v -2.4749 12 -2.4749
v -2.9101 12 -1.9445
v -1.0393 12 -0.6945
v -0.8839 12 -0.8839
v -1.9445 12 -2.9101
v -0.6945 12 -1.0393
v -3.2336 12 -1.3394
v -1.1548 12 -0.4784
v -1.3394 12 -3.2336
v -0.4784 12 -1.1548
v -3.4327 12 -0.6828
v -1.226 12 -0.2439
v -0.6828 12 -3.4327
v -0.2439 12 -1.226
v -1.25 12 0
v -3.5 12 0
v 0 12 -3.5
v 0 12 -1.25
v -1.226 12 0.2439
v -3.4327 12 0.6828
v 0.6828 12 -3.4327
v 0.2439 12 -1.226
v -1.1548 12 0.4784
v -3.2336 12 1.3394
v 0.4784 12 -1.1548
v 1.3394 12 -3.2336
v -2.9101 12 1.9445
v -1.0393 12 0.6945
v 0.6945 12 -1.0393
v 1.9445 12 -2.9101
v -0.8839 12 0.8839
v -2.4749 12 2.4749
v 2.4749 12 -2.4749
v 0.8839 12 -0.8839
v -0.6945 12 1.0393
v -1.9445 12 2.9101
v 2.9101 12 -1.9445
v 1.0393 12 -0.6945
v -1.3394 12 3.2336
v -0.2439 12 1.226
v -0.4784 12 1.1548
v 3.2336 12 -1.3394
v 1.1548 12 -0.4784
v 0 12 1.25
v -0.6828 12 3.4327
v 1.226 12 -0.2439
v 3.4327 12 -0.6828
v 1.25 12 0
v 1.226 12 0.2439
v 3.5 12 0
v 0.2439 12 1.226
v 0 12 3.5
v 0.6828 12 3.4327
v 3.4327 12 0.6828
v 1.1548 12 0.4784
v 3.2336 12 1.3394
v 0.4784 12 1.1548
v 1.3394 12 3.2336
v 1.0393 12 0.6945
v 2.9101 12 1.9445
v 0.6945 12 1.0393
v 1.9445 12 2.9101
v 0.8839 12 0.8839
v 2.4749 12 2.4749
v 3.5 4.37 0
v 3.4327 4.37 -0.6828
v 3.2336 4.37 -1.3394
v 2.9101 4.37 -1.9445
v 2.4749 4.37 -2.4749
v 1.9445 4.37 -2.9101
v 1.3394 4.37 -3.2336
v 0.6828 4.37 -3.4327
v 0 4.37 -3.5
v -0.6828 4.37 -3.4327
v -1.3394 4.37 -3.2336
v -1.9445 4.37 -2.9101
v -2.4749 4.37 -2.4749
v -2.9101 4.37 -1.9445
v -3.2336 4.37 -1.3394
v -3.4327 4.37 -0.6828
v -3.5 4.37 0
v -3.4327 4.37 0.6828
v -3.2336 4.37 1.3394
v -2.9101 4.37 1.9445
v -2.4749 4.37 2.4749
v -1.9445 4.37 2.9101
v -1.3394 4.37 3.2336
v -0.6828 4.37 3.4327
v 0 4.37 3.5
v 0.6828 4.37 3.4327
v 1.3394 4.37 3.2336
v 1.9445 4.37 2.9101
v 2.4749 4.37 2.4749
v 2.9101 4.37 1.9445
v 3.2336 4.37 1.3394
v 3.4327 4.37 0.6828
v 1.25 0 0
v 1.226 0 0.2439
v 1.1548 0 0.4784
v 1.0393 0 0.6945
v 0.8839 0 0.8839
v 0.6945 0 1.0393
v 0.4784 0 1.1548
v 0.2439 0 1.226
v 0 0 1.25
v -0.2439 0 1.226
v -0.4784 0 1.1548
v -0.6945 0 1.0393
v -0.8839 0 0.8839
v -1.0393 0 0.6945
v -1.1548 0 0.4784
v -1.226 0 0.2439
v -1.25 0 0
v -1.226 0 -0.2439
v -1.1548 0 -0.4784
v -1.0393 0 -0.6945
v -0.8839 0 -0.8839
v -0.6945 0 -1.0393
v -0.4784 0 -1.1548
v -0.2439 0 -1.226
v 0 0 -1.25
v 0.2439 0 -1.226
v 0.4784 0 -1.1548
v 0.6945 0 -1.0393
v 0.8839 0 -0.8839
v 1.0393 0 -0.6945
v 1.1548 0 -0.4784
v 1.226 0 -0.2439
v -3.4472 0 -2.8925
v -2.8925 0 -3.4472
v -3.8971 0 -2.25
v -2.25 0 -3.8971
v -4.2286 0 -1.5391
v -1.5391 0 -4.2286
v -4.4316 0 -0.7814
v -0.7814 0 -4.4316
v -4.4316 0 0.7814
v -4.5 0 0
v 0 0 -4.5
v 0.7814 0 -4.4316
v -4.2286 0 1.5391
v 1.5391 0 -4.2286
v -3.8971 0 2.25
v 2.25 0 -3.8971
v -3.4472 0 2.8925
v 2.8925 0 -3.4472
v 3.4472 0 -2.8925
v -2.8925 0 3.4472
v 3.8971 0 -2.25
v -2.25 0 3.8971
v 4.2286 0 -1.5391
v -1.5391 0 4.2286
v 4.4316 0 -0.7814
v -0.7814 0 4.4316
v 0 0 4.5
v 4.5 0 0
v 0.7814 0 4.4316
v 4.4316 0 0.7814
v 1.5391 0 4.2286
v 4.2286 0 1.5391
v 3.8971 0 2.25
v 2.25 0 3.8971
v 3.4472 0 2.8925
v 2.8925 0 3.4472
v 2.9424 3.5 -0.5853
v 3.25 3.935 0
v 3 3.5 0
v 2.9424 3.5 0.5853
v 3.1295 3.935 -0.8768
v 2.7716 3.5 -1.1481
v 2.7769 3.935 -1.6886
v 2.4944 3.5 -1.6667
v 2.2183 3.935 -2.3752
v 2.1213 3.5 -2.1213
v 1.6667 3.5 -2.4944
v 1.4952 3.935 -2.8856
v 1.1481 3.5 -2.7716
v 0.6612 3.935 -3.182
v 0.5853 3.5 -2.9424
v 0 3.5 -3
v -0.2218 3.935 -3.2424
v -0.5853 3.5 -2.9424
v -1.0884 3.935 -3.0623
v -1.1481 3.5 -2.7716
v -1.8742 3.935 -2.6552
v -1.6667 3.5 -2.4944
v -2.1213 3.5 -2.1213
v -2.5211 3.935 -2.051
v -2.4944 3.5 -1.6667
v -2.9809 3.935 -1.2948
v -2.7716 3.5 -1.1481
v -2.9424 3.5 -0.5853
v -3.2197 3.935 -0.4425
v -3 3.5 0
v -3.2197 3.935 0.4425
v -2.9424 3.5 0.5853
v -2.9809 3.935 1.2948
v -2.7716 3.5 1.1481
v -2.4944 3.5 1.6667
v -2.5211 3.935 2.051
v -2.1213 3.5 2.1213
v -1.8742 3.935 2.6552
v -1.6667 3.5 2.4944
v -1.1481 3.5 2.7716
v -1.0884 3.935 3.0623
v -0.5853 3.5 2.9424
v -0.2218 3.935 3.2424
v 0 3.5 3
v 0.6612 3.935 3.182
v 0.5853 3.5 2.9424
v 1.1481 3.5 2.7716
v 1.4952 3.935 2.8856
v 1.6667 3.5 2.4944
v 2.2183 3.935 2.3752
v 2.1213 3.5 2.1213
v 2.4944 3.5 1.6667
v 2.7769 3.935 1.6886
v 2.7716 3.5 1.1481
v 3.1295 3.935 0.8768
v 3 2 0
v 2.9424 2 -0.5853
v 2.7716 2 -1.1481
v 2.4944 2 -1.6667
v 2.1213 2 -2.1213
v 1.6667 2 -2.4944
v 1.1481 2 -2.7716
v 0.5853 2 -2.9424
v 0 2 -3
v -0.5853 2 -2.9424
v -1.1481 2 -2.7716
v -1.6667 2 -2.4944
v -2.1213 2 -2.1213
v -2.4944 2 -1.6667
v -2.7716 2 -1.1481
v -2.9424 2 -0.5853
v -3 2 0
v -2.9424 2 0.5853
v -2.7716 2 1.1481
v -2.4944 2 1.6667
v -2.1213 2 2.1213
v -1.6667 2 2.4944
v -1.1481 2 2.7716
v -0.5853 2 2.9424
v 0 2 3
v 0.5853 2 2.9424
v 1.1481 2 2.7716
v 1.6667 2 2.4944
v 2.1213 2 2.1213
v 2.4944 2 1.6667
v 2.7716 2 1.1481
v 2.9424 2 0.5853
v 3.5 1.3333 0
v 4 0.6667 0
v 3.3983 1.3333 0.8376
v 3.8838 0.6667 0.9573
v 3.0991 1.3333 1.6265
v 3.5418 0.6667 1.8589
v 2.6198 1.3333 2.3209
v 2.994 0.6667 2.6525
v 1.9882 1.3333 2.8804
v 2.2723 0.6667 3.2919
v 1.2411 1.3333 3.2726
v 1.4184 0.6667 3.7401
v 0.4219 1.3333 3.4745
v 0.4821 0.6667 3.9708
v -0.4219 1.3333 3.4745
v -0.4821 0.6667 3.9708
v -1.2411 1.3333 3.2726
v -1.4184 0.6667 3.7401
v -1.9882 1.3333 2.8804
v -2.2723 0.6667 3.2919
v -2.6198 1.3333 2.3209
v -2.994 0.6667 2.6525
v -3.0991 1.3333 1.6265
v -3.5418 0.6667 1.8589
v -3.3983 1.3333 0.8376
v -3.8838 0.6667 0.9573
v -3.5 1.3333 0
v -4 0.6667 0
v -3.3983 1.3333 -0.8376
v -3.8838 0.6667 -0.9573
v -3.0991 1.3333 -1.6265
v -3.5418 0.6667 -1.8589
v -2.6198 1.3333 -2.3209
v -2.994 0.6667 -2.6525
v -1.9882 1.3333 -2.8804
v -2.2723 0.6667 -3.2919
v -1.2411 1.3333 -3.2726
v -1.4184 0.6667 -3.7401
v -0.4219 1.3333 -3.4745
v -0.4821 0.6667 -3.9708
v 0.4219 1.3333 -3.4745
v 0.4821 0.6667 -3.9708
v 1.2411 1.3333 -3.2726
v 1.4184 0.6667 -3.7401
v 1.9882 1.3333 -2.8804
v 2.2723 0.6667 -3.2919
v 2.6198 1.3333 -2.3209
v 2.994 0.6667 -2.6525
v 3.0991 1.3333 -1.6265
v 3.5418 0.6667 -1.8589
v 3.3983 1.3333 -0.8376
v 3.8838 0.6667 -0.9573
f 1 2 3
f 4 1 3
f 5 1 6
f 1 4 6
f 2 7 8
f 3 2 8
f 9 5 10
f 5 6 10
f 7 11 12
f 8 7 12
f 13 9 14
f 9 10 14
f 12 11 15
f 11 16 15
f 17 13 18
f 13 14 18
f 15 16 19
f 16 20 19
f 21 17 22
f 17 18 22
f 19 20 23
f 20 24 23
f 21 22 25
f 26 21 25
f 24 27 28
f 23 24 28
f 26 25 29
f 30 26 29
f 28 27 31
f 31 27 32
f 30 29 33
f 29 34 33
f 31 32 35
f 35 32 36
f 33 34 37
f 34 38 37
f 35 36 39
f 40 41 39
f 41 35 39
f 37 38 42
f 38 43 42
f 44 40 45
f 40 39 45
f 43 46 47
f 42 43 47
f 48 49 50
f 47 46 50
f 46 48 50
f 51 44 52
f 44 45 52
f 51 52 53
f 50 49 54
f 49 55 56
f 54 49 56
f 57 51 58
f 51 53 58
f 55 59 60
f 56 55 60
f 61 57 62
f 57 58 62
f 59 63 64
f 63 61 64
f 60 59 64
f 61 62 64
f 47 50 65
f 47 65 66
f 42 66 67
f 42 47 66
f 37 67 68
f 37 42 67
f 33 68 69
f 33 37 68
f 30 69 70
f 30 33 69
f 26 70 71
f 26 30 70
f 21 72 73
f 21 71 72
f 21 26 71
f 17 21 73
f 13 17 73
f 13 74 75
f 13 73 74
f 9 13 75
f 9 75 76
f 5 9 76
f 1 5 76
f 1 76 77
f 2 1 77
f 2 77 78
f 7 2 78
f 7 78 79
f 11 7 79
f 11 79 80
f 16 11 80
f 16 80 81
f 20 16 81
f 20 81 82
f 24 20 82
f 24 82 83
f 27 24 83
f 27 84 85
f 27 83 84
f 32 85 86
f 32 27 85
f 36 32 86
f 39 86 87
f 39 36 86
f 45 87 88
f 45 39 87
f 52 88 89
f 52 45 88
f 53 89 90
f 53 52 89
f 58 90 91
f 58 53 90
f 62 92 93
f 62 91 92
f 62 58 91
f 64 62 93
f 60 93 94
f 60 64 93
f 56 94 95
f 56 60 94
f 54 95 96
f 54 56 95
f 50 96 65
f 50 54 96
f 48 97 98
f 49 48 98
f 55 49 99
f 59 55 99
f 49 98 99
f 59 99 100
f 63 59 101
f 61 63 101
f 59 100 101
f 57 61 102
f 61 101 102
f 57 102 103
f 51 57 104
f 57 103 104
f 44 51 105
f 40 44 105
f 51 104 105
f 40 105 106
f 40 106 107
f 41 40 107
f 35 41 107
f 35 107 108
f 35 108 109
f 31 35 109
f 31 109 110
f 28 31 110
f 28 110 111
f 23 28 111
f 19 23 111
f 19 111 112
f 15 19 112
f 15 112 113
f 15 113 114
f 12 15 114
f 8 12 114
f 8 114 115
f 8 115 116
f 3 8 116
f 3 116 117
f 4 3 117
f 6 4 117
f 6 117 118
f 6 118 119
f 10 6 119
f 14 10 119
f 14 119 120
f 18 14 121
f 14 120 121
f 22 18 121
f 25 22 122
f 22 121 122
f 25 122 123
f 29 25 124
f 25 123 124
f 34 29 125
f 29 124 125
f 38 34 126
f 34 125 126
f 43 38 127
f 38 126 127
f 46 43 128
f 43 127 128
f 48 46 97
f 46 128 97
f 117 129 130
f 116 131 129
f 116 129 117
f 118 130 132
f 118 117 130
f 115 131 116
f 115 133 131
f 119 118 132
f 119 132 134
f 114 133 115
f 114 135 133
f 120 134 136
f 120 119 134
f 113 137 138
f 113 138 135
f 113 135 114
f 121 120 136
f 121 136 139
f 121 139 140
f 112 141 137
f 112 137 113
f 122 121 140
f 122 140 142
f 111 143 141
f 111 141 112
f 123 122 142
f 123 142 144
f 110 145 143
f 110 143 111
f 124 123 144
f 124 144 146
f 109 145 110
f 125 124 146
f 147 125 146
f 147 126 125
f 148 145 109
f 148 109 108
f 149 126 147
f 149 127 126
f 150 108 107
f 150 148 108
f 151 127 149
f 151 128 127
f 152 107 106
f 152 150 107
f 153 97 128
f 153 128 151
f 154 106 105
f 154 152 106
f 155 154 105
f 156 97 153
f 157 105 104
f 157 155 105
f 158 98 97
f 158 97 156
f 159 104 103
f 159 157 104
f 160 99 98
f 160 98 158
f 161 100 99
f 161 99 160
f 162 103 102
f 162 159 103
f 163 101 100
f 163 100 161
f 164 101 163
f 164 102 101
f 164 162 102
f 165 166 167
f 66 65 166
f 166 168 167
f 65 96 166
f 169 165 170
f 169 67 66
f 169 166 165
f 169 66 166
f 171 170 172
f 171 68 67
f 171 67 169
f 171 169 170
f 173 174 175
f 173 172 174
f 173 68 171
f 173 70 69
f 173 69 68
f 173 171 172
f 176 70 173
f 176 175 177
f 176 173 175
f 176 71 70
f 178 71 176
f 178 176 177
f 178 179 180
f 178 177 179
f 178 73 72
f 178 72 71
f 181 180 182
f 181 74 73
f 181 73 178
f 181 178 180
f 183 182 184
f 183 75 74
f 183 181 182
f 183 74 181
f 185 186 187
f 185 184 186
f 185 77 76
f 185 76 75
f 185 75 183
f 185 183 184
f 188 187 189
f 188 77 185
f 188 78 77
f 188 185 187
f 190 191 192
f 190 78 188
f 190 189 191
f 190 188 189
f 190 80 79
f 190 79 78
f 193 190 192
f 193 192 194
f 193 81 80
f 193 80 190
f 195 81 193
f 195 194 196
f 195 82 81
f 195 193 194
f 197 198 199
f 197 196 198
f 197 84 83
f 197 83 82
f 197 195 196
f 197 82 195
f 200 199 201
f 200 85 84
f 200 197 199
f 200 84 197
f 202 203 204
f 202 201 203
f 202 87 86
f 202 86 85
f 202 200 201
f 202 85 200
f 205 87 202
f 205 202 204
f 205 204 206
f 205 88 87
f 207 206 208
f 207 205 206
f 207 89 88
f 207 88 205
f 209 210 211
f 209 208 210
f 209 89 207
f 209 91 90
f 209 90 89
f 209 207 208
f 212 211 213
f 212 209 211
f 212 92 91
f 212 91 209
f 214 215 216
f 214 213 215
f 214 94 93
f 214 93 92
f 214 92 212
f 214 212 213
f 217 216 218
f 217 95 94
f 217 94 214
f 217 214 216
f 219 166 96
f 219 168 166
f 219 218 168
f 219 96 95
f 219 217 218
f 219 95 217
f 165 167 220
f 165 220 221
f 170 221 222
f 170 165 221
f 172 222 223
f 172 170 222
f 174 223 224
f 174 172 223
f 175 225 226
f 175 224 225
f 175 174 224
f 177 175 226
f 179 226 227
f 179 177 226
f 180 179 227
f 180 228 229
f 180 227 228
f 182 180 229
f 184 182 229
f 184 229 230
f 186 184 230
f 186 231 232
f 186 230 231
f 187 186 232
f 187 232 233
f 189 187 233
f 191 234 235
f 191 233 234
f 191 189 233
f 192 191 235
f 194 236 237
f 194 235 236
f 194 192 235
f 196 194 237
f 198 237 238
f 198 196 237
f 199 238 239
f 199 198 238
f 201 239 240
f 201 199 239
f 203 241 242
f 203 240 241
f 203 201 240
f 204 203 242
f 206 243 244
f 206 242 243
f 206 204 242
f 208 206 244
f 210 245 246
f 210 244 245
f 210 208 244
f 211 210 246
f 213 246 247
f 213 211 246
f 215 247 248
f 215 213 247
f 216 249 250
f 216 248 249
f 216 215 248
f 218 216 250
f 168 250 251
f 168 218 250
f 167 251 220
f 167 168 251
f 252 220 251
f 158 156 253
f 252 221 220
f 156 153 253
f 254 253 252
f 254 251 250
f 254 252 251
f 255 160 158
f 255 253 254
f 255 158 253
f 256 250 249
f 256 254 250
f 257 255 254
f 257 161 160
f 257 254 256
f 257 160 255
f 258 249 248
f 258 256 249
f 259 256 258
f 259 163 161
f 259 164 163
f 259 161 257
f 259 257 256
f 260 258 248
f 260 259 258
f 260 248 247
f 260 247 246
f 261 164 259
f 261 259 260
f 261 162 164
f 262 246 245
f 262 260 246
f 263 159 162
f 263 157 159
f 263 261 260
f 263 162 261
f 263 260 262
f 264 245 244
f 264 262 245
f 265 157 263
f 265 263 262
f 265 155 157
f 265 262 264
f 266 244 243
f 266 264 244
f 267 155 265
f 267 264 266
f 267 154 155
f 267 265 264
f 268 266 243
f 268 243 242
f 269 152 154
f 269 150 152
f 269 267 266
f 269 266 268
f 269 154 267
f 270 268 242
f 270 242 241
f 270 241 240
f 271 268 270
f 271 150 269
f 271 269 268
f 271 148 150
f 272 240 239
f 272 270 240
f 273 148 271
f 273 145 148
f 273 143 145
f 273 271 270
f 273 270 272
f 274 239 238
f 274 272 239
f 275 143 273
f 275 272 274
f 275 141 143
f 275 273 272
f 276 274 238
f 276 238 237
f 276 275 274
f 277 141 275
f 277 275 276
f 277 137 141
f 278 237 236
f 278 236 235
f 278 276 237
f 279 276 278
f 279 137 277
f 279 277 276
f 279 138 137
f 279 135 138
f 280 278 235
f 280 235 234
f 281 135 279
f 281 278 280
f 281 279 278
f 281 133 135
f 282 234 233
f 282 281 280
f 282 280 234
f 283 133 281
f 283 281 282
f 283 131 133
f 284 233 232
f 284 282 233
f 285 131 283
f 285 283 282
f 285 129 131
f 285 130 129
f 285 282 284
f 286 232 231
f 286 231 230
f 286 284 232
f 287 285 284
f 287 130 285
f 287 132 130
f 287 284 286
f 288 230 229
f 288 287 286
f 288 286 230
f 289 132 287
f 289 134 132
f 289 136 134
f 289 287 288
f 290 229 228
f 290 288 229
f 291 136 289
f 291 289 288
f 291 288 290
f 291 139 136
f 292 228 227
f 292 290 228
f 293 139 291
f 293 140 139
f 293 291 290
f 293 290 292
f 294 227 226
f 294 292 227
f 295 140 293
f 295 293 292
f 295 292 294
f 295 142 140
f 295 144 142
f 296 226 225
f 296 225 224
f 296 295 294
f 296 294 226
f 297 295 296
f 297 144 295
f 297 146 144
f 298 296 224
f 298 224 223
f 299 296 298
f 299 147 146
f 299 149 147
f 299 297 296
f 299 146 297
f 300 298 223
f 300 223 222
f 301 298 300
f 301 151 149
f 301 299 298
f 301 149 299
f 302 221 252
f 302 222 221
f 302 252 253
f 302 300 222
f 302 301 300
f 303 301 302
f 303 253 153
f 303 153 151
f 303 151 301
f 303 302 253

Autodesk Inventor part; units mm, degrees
sketch "Sketch_3" plane through (0, 0, 0) normal (0, 0, 1) x (1, 0, 0)
  line L0 (0, 0) -> (0, 12)
  line L1 (1.25, 12) -> (1.25, 0)
  line L2 (1.25, 0) -> (4.5, 0)
  line L3 (4.5, 0) -> (3, 2)
  line L4 (3, 2) -> (3, 3.5)
  line L5 (3, 3.5) -> (3.5, 4.37)
  line L6 (3.5, 4.37) -> (3.5, 12)
  line L7 (3.5, 12) -> (1.25, 12)
revolve "Revolution1" add sketch "Sketch_3" angle 360 about axis through (0, 0, 0) along (0, -1, 0)
ref_plane "PAD_DUMMY_XY" through (0, 0, 0) normal (0, -1, 0) x (1, 0, 0)
ref_plane "PAD_DUMMY_YZ" through (0, 0, 0) normal (1, 0, 0) x (0, 0, 1)
ref_plane "PAD_DUMMY_ZX" through (0, 0, 0) normal (0, 0, 1) x (0, -1, 0)
ref_plane "pad_a_XY" through (0, 12, 0) normal (0, 1, 0) x (1, 0, 0)
ref_plane "pad_a_YZ" through (0, 12, 0) normal (1, 0, 0) x (0, 0, -1)
ref_plane "pad_a_ZX" through (0, 12, 0) normal (0, 0, -1) x (0, 1, 0)
properties part number "ZP08U_T_B"
